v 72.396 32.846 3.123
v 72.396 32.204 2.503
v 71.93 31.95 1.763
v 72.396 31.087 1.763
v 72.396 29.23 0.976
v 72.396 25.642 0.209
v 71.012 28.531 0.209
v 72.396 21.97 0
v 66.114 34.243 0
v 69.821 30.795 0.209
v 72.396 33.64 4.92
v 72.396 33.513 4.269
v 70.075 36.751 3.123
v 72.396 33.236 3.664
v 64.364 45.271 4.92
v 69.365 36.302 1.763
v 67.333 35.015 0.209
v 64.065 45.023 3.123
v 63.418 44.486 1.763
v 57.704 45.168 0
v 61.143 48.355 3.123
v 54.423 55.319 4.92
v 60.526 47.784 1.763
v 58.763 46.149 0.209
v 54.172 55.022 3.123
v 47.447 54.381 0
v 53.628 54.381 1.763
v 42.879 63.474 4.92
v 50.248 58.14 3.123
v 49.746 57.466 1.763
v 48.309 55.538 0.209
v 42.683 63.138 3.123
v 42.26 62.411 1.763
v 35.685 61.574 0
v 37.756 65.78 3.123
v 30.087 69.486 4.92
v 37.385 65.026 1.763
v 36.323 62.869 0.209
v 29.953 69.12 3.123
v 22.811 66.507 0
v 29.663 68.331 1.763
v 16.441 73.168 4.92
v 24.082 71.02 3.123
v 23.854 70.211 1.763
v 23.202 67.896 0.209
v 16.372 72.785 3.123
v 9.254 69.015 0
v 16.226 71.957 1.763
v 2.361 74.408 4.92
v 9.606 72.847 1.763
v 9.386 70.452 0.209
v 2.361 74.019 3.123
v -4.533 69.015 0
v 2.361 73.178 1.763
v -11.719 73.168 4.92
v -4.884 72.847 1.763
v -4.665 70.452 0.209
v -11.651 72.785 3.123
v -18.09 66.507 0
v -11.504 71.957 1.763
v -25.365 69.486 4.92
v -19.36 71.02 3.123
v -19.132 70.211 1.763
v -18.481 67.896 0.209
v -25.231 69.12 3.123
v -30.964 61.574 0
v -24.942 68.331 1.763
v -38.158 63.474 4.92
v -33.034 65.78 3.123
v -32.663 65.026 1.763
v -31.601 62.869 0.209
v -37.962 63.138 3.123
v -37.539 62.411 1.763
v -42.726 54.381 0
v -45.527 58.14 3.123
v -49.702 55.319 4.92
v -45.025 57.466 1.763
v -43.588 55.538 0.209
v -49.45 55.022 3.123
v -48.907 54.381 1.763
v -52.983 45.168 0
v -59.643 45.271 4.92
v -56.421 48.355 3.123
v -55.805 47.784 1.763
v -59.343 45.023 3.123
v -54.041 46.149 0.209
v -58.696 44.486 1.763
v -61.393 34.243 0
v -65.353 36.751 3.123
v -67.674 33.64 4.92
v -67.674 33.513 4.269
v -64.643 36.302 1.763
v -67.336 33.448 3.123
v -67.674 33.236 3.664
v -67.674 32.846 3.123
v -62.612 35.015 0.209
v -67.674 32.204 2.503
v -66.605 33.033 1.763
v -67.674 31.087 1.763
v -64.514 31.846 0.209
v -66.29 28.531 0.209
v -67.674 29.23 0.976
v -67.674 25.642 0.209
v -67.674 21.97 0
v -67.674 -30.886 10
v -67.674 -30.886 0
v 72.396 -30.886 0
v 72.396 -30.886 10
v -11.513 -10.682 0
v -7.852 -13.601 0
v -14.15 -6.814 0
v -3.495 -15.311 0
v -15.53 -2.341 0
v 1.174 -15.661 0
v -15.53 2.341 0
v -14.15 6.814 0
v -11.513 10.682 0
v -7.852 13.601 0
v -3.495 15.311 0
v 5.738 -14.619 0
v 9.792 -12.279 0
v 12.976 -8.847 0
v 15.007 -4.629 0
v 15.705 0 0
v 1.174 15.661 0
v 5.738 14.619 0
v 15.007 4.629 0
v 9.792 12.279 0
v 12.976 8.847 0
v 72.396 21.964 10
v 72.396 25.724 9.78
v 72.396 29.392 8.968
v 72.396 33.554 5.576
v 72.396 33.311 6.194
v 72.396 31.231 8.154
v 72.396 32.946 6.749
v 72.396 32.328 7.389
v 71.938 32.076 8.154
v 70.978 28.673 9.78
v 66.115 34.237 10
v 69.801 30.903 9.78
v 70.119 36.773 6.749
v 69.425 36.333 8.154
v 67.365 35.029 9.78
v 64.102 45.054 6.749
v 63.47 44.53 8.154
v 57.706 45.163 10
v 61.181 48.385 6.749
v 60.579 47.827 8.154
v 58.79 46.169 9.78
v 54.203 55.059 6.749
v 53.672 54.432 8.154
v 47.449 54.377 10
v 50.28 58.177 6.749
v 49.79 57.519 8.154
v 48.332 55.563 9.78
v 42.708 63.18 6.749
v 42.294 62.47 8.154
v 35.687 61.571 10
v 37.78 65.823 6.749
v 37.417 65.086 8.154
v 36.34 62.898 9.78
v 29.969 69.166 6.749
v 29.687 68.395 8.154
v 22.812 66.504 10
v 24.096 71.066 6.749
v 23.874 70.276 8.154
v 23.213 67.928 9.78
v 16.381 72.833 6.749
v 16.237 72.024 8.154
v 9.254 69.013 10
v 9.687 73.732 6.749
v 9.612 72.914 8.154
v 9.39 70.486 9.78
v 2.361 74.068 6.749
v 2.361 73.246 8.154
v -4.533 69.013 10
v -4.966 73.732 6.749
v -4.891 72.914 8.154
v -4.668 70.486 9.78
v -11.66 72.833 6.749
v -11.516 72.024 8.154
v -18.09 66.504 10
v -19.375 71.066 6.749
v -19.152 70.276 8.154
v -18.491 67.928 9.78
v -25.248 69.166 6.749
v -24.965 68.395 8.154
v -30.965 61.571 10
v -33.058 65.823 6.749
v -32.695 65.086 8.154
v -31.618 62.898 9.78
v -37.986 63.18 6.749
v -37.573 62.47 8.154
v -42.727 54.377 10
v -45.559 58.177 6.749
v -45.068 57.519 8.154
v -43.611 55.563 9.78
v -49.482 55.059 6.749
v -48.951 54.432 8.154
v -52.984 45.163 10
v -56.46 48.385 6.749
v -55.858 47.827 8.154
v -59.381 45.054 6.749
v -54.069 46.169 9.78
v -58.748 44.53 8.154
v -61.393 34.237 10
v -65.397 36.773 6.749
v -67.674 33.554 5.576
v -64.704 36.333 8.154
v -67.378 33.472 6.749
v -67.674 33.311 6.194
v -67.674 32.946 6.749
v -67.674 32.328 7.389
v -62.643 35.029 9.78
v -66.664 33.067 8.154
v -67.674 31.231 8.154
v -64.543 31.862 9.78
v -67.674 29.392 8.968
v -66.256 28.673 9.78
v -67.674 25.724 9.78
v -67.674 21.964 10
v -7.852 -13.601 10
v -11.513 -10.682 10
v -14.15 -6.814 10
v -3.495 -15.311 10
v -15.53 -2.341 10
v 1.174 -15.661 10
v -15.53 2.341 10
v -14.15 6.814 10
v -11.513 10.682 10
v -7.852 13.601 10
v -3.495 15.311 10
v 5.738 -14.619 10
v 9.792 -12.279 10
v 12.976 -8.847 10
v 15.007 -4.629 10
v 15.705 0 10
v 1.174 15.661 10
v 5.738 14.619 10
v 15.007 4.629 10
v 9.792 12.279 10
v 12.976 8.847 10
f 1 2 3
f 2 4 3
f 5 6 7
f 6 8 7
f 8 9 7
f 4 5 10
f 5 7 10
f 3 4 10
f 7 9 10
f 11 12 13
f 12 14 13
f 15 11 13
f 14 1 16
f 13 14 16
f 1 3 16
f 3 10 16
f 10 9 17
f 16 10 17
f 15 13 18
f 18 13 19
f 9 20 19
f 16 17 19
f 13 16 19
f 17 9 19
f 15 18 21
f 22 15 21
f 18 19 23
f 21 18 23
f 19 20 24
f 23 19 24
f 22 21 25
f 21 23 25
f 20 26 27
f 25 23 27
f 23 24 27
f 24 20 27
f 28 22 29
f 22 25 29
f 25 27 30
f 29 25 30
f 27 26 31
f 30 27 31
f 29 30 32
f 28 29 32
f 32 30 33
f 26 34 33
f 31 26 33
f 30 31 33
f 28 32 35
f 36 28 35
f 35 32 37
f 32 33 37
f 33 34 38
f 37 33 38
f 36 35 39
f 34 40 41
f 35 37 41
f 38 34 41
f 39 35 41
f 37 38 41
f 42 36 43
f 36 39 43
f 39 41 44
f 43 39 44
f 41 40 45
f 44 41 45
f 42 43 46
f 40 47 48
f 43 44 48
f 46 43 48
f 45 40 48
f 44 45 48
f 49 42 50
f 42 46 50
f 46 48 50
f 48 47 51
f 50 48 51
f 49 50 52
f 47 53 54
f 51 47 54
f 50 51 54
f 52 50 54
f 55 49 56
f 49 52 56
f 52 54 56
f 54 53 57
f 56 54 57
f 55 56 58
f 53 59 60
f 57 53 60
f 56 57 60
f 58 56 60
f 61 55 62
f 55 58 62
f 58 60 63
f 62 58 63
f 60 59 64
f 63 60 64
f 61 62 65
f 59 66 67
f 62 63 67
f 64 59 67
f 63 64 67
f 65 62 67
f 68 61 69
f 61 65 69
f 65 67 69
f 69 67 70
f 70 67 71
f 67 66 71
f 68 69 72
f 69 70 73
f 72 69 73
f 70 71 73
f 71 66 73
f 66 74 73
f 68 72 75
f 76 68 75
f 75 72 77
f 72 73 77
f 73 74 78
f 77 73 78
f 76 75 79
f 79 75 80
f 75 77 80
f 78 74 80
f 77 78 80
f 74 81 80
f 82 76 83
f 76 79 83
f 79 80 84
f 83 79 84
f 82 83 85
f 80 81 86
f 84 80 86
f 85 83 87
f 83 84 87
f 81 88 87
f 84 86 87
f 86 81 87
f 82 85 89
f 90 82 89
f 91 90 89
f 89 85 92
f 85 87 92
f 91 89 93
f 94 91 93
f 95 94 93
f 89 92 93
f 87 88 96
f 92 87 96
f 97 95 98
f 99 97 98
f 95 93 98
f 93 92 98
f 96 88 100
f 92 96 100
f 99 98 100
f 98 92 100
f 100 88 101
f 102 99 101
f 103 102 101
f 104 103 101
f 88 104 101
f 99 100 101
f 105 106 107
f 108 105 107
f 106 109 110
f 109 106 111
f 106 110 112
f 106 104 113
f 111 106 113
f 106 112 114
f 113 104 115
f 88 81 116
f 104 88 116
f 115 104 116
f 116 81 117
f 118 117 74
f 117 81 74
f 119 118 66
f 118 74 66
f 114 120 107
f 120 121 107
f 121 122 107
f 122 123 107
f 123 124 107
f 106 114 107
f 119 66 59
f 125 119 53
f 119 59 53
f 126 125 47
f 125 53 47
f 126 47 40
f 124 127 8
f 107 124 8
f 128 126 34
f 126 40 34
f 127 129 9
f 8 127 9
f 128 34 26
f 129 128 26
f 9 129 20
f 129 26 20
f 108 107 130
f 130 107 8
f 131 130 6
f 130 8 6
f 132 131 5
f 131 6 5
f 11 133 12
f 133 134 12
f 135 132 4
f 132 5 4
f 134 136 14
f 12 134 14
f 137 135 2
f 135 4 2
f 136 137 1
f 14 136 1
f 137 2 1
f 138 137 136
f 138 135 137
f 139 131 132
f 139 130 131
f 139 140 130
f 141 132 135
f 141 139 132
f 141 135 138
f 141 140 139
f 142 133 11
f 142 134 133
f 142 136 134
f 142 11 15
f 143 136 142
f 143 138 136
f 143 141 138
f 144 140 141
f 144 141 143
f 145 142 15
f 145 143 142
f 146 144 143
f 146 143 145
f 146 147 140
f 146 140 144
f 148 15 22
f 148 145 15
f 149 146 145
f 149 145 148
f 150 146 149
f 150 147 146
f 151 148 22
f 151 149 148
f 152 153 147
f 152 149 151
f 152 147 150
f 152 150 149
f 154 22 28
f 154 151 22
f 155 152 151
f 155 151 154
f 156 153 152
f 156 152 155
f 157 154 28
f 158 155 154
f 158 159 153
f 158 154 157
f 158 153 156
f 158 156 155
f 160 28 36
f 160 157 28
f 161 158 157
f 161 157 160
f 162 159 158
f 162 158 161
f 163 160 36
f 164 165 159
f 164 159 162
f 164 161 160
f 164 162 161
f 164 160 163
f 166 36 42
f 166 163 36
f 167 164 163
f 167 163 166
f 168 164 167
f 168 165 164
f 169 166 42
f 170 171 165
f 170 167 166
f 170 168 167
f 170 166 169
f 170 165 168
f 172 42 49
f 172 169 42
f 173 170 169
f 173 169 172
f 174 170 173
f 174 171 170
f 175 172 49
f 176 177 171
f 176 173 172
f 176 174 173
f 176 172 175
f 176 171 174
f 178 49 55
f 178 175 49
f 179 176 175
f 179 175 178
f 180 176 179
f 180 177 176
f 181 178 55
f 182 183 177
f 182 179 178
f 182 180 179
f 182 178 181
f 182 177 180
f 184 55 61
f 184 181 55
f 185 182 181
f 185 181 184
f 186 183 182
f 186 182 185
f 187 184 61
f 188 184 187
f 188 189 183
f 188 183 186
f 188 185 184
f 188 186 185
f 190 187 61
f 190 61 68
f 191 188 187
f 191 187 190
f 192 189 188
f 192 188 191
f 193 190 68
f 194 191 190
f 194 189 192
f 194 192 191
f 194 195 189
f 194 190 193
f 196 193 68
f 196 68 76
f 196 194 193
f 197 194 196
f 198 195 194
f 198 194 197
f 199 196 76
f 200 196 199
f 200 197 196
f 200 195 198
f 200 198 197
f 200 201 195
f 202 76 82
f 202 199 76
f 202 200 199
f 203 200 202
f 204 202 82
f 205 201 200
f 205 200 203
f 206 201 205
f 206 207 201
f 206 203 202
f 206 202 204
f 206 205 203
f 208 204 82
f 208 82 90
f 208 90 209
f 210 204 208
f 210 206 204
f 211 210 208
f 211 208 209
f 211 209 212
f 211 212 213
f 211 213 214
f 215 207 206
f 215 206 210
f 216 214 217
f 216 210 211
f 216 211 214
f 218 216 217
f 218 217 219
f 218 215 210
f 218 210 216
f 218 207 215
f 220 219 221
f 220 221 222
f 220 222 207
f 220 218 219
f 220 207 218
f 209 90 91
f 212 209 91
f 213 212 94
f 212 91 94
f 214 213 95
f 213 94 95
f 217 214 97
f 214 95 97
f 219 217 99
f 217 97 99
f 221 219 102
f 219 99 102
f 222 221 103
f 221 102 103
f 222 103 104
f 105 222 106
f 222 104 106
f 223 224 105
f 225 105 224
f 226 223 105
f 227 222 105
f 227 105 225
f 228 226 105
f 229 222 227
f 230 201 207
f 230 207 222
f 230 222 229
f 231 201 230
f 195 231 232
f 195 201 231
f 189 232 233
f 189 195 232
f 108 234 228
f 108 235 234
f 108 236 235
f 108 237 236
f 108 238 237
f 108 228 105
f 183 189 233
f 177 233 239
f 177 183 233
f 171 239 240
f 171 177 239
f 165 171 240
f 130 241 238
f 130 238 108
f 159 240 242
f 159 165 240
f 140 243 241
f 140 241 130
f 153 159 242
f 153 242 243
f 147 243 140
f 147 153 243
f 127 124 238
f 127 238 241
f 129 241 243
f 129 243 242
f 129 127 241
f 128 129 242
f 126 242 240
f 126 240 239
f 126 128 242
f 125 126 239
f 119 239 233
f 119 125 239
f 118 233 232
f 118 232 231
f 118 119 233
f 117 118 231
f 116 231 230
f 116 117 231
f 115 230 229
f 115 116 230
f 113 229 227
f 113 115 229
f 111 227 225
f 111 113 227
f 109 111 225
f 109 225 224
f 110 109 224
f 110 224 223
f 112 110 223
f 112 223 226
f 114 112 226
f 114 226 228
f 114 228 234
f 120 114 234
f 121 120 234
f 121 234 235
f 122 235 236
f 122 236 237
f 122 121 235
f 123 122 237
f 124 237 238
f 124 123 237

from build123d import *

# Parameters (mm, degrees)
F0_R        = 15.7049958866
F1_DEPTH    = 10
F2_R        = 5.08
F3_T2_ANGLE = 138.8894896051


# Not quite as in the source:
# - a fillet or chamfer that OpenCascade refuses, or shapes differently, is made with other operations: its cross-section is extruded or revolved along the edge and cut away or added


with BuildPart() as f1:
    # F0 (on Top) → F1 (new body)
    with BuildSketch(Plane.XY):
        with BuildLine():
            Line((-67.6743760705, 33.6404591799), (-67.6743760705, -30.8862738311))
            Line((-67.6743760705, -30.8862738311), (72.3958462477, -30.8862738311))
            Line((72.3958462477, -30.8862738311), (72.3958462477, 33.6404591799))
            ThreePointArc((72.3958462477, 33.6404591799), (2.3607350886, 74.4084313611), (-67.6743760705, 33.6404591799))
        make_face()
        Circle(F0_R, mode=Mode.SUBTRACT)
    extrude(amount=F1_DEPTH)

    # F2
    f2_edges = [f1.edges().sort_by_distance(p)[0] for p in [
        (2.360735, 74.408431, 10),
    ]]
    fillet(f2_edges, radius=F2_R)

    # F3: fillet of radius 5.08 on 1 edges, made by hand

    # F3_s1 → F3_t2 (revolve, cut)
    with BuildSketch(Plane(origin=(2.3069814419, -6.152208534, 0), x_dir=(0, 0, 1), z_dir=(0.351110531, -0.9363340189, 0))):
        with BuildLine():
            ThreePointArc((4.92, -80.5978917459), (1.4317675513, -79.0554933848), (0, -75.5204120561))
            Line((0, -75.5204120561), (0, -80.5978917459))
            Line((0, -80.5978917459), (4.92, -80.5978917459))
        make_face()
    revolve(axis=Axis((2.3607350886, -6.1320517619, 0), (0, 0, 1)), revolution_arc=F3_T2_ANGLE, mode=Mode.SUBTRACT)


solid = f1.part
